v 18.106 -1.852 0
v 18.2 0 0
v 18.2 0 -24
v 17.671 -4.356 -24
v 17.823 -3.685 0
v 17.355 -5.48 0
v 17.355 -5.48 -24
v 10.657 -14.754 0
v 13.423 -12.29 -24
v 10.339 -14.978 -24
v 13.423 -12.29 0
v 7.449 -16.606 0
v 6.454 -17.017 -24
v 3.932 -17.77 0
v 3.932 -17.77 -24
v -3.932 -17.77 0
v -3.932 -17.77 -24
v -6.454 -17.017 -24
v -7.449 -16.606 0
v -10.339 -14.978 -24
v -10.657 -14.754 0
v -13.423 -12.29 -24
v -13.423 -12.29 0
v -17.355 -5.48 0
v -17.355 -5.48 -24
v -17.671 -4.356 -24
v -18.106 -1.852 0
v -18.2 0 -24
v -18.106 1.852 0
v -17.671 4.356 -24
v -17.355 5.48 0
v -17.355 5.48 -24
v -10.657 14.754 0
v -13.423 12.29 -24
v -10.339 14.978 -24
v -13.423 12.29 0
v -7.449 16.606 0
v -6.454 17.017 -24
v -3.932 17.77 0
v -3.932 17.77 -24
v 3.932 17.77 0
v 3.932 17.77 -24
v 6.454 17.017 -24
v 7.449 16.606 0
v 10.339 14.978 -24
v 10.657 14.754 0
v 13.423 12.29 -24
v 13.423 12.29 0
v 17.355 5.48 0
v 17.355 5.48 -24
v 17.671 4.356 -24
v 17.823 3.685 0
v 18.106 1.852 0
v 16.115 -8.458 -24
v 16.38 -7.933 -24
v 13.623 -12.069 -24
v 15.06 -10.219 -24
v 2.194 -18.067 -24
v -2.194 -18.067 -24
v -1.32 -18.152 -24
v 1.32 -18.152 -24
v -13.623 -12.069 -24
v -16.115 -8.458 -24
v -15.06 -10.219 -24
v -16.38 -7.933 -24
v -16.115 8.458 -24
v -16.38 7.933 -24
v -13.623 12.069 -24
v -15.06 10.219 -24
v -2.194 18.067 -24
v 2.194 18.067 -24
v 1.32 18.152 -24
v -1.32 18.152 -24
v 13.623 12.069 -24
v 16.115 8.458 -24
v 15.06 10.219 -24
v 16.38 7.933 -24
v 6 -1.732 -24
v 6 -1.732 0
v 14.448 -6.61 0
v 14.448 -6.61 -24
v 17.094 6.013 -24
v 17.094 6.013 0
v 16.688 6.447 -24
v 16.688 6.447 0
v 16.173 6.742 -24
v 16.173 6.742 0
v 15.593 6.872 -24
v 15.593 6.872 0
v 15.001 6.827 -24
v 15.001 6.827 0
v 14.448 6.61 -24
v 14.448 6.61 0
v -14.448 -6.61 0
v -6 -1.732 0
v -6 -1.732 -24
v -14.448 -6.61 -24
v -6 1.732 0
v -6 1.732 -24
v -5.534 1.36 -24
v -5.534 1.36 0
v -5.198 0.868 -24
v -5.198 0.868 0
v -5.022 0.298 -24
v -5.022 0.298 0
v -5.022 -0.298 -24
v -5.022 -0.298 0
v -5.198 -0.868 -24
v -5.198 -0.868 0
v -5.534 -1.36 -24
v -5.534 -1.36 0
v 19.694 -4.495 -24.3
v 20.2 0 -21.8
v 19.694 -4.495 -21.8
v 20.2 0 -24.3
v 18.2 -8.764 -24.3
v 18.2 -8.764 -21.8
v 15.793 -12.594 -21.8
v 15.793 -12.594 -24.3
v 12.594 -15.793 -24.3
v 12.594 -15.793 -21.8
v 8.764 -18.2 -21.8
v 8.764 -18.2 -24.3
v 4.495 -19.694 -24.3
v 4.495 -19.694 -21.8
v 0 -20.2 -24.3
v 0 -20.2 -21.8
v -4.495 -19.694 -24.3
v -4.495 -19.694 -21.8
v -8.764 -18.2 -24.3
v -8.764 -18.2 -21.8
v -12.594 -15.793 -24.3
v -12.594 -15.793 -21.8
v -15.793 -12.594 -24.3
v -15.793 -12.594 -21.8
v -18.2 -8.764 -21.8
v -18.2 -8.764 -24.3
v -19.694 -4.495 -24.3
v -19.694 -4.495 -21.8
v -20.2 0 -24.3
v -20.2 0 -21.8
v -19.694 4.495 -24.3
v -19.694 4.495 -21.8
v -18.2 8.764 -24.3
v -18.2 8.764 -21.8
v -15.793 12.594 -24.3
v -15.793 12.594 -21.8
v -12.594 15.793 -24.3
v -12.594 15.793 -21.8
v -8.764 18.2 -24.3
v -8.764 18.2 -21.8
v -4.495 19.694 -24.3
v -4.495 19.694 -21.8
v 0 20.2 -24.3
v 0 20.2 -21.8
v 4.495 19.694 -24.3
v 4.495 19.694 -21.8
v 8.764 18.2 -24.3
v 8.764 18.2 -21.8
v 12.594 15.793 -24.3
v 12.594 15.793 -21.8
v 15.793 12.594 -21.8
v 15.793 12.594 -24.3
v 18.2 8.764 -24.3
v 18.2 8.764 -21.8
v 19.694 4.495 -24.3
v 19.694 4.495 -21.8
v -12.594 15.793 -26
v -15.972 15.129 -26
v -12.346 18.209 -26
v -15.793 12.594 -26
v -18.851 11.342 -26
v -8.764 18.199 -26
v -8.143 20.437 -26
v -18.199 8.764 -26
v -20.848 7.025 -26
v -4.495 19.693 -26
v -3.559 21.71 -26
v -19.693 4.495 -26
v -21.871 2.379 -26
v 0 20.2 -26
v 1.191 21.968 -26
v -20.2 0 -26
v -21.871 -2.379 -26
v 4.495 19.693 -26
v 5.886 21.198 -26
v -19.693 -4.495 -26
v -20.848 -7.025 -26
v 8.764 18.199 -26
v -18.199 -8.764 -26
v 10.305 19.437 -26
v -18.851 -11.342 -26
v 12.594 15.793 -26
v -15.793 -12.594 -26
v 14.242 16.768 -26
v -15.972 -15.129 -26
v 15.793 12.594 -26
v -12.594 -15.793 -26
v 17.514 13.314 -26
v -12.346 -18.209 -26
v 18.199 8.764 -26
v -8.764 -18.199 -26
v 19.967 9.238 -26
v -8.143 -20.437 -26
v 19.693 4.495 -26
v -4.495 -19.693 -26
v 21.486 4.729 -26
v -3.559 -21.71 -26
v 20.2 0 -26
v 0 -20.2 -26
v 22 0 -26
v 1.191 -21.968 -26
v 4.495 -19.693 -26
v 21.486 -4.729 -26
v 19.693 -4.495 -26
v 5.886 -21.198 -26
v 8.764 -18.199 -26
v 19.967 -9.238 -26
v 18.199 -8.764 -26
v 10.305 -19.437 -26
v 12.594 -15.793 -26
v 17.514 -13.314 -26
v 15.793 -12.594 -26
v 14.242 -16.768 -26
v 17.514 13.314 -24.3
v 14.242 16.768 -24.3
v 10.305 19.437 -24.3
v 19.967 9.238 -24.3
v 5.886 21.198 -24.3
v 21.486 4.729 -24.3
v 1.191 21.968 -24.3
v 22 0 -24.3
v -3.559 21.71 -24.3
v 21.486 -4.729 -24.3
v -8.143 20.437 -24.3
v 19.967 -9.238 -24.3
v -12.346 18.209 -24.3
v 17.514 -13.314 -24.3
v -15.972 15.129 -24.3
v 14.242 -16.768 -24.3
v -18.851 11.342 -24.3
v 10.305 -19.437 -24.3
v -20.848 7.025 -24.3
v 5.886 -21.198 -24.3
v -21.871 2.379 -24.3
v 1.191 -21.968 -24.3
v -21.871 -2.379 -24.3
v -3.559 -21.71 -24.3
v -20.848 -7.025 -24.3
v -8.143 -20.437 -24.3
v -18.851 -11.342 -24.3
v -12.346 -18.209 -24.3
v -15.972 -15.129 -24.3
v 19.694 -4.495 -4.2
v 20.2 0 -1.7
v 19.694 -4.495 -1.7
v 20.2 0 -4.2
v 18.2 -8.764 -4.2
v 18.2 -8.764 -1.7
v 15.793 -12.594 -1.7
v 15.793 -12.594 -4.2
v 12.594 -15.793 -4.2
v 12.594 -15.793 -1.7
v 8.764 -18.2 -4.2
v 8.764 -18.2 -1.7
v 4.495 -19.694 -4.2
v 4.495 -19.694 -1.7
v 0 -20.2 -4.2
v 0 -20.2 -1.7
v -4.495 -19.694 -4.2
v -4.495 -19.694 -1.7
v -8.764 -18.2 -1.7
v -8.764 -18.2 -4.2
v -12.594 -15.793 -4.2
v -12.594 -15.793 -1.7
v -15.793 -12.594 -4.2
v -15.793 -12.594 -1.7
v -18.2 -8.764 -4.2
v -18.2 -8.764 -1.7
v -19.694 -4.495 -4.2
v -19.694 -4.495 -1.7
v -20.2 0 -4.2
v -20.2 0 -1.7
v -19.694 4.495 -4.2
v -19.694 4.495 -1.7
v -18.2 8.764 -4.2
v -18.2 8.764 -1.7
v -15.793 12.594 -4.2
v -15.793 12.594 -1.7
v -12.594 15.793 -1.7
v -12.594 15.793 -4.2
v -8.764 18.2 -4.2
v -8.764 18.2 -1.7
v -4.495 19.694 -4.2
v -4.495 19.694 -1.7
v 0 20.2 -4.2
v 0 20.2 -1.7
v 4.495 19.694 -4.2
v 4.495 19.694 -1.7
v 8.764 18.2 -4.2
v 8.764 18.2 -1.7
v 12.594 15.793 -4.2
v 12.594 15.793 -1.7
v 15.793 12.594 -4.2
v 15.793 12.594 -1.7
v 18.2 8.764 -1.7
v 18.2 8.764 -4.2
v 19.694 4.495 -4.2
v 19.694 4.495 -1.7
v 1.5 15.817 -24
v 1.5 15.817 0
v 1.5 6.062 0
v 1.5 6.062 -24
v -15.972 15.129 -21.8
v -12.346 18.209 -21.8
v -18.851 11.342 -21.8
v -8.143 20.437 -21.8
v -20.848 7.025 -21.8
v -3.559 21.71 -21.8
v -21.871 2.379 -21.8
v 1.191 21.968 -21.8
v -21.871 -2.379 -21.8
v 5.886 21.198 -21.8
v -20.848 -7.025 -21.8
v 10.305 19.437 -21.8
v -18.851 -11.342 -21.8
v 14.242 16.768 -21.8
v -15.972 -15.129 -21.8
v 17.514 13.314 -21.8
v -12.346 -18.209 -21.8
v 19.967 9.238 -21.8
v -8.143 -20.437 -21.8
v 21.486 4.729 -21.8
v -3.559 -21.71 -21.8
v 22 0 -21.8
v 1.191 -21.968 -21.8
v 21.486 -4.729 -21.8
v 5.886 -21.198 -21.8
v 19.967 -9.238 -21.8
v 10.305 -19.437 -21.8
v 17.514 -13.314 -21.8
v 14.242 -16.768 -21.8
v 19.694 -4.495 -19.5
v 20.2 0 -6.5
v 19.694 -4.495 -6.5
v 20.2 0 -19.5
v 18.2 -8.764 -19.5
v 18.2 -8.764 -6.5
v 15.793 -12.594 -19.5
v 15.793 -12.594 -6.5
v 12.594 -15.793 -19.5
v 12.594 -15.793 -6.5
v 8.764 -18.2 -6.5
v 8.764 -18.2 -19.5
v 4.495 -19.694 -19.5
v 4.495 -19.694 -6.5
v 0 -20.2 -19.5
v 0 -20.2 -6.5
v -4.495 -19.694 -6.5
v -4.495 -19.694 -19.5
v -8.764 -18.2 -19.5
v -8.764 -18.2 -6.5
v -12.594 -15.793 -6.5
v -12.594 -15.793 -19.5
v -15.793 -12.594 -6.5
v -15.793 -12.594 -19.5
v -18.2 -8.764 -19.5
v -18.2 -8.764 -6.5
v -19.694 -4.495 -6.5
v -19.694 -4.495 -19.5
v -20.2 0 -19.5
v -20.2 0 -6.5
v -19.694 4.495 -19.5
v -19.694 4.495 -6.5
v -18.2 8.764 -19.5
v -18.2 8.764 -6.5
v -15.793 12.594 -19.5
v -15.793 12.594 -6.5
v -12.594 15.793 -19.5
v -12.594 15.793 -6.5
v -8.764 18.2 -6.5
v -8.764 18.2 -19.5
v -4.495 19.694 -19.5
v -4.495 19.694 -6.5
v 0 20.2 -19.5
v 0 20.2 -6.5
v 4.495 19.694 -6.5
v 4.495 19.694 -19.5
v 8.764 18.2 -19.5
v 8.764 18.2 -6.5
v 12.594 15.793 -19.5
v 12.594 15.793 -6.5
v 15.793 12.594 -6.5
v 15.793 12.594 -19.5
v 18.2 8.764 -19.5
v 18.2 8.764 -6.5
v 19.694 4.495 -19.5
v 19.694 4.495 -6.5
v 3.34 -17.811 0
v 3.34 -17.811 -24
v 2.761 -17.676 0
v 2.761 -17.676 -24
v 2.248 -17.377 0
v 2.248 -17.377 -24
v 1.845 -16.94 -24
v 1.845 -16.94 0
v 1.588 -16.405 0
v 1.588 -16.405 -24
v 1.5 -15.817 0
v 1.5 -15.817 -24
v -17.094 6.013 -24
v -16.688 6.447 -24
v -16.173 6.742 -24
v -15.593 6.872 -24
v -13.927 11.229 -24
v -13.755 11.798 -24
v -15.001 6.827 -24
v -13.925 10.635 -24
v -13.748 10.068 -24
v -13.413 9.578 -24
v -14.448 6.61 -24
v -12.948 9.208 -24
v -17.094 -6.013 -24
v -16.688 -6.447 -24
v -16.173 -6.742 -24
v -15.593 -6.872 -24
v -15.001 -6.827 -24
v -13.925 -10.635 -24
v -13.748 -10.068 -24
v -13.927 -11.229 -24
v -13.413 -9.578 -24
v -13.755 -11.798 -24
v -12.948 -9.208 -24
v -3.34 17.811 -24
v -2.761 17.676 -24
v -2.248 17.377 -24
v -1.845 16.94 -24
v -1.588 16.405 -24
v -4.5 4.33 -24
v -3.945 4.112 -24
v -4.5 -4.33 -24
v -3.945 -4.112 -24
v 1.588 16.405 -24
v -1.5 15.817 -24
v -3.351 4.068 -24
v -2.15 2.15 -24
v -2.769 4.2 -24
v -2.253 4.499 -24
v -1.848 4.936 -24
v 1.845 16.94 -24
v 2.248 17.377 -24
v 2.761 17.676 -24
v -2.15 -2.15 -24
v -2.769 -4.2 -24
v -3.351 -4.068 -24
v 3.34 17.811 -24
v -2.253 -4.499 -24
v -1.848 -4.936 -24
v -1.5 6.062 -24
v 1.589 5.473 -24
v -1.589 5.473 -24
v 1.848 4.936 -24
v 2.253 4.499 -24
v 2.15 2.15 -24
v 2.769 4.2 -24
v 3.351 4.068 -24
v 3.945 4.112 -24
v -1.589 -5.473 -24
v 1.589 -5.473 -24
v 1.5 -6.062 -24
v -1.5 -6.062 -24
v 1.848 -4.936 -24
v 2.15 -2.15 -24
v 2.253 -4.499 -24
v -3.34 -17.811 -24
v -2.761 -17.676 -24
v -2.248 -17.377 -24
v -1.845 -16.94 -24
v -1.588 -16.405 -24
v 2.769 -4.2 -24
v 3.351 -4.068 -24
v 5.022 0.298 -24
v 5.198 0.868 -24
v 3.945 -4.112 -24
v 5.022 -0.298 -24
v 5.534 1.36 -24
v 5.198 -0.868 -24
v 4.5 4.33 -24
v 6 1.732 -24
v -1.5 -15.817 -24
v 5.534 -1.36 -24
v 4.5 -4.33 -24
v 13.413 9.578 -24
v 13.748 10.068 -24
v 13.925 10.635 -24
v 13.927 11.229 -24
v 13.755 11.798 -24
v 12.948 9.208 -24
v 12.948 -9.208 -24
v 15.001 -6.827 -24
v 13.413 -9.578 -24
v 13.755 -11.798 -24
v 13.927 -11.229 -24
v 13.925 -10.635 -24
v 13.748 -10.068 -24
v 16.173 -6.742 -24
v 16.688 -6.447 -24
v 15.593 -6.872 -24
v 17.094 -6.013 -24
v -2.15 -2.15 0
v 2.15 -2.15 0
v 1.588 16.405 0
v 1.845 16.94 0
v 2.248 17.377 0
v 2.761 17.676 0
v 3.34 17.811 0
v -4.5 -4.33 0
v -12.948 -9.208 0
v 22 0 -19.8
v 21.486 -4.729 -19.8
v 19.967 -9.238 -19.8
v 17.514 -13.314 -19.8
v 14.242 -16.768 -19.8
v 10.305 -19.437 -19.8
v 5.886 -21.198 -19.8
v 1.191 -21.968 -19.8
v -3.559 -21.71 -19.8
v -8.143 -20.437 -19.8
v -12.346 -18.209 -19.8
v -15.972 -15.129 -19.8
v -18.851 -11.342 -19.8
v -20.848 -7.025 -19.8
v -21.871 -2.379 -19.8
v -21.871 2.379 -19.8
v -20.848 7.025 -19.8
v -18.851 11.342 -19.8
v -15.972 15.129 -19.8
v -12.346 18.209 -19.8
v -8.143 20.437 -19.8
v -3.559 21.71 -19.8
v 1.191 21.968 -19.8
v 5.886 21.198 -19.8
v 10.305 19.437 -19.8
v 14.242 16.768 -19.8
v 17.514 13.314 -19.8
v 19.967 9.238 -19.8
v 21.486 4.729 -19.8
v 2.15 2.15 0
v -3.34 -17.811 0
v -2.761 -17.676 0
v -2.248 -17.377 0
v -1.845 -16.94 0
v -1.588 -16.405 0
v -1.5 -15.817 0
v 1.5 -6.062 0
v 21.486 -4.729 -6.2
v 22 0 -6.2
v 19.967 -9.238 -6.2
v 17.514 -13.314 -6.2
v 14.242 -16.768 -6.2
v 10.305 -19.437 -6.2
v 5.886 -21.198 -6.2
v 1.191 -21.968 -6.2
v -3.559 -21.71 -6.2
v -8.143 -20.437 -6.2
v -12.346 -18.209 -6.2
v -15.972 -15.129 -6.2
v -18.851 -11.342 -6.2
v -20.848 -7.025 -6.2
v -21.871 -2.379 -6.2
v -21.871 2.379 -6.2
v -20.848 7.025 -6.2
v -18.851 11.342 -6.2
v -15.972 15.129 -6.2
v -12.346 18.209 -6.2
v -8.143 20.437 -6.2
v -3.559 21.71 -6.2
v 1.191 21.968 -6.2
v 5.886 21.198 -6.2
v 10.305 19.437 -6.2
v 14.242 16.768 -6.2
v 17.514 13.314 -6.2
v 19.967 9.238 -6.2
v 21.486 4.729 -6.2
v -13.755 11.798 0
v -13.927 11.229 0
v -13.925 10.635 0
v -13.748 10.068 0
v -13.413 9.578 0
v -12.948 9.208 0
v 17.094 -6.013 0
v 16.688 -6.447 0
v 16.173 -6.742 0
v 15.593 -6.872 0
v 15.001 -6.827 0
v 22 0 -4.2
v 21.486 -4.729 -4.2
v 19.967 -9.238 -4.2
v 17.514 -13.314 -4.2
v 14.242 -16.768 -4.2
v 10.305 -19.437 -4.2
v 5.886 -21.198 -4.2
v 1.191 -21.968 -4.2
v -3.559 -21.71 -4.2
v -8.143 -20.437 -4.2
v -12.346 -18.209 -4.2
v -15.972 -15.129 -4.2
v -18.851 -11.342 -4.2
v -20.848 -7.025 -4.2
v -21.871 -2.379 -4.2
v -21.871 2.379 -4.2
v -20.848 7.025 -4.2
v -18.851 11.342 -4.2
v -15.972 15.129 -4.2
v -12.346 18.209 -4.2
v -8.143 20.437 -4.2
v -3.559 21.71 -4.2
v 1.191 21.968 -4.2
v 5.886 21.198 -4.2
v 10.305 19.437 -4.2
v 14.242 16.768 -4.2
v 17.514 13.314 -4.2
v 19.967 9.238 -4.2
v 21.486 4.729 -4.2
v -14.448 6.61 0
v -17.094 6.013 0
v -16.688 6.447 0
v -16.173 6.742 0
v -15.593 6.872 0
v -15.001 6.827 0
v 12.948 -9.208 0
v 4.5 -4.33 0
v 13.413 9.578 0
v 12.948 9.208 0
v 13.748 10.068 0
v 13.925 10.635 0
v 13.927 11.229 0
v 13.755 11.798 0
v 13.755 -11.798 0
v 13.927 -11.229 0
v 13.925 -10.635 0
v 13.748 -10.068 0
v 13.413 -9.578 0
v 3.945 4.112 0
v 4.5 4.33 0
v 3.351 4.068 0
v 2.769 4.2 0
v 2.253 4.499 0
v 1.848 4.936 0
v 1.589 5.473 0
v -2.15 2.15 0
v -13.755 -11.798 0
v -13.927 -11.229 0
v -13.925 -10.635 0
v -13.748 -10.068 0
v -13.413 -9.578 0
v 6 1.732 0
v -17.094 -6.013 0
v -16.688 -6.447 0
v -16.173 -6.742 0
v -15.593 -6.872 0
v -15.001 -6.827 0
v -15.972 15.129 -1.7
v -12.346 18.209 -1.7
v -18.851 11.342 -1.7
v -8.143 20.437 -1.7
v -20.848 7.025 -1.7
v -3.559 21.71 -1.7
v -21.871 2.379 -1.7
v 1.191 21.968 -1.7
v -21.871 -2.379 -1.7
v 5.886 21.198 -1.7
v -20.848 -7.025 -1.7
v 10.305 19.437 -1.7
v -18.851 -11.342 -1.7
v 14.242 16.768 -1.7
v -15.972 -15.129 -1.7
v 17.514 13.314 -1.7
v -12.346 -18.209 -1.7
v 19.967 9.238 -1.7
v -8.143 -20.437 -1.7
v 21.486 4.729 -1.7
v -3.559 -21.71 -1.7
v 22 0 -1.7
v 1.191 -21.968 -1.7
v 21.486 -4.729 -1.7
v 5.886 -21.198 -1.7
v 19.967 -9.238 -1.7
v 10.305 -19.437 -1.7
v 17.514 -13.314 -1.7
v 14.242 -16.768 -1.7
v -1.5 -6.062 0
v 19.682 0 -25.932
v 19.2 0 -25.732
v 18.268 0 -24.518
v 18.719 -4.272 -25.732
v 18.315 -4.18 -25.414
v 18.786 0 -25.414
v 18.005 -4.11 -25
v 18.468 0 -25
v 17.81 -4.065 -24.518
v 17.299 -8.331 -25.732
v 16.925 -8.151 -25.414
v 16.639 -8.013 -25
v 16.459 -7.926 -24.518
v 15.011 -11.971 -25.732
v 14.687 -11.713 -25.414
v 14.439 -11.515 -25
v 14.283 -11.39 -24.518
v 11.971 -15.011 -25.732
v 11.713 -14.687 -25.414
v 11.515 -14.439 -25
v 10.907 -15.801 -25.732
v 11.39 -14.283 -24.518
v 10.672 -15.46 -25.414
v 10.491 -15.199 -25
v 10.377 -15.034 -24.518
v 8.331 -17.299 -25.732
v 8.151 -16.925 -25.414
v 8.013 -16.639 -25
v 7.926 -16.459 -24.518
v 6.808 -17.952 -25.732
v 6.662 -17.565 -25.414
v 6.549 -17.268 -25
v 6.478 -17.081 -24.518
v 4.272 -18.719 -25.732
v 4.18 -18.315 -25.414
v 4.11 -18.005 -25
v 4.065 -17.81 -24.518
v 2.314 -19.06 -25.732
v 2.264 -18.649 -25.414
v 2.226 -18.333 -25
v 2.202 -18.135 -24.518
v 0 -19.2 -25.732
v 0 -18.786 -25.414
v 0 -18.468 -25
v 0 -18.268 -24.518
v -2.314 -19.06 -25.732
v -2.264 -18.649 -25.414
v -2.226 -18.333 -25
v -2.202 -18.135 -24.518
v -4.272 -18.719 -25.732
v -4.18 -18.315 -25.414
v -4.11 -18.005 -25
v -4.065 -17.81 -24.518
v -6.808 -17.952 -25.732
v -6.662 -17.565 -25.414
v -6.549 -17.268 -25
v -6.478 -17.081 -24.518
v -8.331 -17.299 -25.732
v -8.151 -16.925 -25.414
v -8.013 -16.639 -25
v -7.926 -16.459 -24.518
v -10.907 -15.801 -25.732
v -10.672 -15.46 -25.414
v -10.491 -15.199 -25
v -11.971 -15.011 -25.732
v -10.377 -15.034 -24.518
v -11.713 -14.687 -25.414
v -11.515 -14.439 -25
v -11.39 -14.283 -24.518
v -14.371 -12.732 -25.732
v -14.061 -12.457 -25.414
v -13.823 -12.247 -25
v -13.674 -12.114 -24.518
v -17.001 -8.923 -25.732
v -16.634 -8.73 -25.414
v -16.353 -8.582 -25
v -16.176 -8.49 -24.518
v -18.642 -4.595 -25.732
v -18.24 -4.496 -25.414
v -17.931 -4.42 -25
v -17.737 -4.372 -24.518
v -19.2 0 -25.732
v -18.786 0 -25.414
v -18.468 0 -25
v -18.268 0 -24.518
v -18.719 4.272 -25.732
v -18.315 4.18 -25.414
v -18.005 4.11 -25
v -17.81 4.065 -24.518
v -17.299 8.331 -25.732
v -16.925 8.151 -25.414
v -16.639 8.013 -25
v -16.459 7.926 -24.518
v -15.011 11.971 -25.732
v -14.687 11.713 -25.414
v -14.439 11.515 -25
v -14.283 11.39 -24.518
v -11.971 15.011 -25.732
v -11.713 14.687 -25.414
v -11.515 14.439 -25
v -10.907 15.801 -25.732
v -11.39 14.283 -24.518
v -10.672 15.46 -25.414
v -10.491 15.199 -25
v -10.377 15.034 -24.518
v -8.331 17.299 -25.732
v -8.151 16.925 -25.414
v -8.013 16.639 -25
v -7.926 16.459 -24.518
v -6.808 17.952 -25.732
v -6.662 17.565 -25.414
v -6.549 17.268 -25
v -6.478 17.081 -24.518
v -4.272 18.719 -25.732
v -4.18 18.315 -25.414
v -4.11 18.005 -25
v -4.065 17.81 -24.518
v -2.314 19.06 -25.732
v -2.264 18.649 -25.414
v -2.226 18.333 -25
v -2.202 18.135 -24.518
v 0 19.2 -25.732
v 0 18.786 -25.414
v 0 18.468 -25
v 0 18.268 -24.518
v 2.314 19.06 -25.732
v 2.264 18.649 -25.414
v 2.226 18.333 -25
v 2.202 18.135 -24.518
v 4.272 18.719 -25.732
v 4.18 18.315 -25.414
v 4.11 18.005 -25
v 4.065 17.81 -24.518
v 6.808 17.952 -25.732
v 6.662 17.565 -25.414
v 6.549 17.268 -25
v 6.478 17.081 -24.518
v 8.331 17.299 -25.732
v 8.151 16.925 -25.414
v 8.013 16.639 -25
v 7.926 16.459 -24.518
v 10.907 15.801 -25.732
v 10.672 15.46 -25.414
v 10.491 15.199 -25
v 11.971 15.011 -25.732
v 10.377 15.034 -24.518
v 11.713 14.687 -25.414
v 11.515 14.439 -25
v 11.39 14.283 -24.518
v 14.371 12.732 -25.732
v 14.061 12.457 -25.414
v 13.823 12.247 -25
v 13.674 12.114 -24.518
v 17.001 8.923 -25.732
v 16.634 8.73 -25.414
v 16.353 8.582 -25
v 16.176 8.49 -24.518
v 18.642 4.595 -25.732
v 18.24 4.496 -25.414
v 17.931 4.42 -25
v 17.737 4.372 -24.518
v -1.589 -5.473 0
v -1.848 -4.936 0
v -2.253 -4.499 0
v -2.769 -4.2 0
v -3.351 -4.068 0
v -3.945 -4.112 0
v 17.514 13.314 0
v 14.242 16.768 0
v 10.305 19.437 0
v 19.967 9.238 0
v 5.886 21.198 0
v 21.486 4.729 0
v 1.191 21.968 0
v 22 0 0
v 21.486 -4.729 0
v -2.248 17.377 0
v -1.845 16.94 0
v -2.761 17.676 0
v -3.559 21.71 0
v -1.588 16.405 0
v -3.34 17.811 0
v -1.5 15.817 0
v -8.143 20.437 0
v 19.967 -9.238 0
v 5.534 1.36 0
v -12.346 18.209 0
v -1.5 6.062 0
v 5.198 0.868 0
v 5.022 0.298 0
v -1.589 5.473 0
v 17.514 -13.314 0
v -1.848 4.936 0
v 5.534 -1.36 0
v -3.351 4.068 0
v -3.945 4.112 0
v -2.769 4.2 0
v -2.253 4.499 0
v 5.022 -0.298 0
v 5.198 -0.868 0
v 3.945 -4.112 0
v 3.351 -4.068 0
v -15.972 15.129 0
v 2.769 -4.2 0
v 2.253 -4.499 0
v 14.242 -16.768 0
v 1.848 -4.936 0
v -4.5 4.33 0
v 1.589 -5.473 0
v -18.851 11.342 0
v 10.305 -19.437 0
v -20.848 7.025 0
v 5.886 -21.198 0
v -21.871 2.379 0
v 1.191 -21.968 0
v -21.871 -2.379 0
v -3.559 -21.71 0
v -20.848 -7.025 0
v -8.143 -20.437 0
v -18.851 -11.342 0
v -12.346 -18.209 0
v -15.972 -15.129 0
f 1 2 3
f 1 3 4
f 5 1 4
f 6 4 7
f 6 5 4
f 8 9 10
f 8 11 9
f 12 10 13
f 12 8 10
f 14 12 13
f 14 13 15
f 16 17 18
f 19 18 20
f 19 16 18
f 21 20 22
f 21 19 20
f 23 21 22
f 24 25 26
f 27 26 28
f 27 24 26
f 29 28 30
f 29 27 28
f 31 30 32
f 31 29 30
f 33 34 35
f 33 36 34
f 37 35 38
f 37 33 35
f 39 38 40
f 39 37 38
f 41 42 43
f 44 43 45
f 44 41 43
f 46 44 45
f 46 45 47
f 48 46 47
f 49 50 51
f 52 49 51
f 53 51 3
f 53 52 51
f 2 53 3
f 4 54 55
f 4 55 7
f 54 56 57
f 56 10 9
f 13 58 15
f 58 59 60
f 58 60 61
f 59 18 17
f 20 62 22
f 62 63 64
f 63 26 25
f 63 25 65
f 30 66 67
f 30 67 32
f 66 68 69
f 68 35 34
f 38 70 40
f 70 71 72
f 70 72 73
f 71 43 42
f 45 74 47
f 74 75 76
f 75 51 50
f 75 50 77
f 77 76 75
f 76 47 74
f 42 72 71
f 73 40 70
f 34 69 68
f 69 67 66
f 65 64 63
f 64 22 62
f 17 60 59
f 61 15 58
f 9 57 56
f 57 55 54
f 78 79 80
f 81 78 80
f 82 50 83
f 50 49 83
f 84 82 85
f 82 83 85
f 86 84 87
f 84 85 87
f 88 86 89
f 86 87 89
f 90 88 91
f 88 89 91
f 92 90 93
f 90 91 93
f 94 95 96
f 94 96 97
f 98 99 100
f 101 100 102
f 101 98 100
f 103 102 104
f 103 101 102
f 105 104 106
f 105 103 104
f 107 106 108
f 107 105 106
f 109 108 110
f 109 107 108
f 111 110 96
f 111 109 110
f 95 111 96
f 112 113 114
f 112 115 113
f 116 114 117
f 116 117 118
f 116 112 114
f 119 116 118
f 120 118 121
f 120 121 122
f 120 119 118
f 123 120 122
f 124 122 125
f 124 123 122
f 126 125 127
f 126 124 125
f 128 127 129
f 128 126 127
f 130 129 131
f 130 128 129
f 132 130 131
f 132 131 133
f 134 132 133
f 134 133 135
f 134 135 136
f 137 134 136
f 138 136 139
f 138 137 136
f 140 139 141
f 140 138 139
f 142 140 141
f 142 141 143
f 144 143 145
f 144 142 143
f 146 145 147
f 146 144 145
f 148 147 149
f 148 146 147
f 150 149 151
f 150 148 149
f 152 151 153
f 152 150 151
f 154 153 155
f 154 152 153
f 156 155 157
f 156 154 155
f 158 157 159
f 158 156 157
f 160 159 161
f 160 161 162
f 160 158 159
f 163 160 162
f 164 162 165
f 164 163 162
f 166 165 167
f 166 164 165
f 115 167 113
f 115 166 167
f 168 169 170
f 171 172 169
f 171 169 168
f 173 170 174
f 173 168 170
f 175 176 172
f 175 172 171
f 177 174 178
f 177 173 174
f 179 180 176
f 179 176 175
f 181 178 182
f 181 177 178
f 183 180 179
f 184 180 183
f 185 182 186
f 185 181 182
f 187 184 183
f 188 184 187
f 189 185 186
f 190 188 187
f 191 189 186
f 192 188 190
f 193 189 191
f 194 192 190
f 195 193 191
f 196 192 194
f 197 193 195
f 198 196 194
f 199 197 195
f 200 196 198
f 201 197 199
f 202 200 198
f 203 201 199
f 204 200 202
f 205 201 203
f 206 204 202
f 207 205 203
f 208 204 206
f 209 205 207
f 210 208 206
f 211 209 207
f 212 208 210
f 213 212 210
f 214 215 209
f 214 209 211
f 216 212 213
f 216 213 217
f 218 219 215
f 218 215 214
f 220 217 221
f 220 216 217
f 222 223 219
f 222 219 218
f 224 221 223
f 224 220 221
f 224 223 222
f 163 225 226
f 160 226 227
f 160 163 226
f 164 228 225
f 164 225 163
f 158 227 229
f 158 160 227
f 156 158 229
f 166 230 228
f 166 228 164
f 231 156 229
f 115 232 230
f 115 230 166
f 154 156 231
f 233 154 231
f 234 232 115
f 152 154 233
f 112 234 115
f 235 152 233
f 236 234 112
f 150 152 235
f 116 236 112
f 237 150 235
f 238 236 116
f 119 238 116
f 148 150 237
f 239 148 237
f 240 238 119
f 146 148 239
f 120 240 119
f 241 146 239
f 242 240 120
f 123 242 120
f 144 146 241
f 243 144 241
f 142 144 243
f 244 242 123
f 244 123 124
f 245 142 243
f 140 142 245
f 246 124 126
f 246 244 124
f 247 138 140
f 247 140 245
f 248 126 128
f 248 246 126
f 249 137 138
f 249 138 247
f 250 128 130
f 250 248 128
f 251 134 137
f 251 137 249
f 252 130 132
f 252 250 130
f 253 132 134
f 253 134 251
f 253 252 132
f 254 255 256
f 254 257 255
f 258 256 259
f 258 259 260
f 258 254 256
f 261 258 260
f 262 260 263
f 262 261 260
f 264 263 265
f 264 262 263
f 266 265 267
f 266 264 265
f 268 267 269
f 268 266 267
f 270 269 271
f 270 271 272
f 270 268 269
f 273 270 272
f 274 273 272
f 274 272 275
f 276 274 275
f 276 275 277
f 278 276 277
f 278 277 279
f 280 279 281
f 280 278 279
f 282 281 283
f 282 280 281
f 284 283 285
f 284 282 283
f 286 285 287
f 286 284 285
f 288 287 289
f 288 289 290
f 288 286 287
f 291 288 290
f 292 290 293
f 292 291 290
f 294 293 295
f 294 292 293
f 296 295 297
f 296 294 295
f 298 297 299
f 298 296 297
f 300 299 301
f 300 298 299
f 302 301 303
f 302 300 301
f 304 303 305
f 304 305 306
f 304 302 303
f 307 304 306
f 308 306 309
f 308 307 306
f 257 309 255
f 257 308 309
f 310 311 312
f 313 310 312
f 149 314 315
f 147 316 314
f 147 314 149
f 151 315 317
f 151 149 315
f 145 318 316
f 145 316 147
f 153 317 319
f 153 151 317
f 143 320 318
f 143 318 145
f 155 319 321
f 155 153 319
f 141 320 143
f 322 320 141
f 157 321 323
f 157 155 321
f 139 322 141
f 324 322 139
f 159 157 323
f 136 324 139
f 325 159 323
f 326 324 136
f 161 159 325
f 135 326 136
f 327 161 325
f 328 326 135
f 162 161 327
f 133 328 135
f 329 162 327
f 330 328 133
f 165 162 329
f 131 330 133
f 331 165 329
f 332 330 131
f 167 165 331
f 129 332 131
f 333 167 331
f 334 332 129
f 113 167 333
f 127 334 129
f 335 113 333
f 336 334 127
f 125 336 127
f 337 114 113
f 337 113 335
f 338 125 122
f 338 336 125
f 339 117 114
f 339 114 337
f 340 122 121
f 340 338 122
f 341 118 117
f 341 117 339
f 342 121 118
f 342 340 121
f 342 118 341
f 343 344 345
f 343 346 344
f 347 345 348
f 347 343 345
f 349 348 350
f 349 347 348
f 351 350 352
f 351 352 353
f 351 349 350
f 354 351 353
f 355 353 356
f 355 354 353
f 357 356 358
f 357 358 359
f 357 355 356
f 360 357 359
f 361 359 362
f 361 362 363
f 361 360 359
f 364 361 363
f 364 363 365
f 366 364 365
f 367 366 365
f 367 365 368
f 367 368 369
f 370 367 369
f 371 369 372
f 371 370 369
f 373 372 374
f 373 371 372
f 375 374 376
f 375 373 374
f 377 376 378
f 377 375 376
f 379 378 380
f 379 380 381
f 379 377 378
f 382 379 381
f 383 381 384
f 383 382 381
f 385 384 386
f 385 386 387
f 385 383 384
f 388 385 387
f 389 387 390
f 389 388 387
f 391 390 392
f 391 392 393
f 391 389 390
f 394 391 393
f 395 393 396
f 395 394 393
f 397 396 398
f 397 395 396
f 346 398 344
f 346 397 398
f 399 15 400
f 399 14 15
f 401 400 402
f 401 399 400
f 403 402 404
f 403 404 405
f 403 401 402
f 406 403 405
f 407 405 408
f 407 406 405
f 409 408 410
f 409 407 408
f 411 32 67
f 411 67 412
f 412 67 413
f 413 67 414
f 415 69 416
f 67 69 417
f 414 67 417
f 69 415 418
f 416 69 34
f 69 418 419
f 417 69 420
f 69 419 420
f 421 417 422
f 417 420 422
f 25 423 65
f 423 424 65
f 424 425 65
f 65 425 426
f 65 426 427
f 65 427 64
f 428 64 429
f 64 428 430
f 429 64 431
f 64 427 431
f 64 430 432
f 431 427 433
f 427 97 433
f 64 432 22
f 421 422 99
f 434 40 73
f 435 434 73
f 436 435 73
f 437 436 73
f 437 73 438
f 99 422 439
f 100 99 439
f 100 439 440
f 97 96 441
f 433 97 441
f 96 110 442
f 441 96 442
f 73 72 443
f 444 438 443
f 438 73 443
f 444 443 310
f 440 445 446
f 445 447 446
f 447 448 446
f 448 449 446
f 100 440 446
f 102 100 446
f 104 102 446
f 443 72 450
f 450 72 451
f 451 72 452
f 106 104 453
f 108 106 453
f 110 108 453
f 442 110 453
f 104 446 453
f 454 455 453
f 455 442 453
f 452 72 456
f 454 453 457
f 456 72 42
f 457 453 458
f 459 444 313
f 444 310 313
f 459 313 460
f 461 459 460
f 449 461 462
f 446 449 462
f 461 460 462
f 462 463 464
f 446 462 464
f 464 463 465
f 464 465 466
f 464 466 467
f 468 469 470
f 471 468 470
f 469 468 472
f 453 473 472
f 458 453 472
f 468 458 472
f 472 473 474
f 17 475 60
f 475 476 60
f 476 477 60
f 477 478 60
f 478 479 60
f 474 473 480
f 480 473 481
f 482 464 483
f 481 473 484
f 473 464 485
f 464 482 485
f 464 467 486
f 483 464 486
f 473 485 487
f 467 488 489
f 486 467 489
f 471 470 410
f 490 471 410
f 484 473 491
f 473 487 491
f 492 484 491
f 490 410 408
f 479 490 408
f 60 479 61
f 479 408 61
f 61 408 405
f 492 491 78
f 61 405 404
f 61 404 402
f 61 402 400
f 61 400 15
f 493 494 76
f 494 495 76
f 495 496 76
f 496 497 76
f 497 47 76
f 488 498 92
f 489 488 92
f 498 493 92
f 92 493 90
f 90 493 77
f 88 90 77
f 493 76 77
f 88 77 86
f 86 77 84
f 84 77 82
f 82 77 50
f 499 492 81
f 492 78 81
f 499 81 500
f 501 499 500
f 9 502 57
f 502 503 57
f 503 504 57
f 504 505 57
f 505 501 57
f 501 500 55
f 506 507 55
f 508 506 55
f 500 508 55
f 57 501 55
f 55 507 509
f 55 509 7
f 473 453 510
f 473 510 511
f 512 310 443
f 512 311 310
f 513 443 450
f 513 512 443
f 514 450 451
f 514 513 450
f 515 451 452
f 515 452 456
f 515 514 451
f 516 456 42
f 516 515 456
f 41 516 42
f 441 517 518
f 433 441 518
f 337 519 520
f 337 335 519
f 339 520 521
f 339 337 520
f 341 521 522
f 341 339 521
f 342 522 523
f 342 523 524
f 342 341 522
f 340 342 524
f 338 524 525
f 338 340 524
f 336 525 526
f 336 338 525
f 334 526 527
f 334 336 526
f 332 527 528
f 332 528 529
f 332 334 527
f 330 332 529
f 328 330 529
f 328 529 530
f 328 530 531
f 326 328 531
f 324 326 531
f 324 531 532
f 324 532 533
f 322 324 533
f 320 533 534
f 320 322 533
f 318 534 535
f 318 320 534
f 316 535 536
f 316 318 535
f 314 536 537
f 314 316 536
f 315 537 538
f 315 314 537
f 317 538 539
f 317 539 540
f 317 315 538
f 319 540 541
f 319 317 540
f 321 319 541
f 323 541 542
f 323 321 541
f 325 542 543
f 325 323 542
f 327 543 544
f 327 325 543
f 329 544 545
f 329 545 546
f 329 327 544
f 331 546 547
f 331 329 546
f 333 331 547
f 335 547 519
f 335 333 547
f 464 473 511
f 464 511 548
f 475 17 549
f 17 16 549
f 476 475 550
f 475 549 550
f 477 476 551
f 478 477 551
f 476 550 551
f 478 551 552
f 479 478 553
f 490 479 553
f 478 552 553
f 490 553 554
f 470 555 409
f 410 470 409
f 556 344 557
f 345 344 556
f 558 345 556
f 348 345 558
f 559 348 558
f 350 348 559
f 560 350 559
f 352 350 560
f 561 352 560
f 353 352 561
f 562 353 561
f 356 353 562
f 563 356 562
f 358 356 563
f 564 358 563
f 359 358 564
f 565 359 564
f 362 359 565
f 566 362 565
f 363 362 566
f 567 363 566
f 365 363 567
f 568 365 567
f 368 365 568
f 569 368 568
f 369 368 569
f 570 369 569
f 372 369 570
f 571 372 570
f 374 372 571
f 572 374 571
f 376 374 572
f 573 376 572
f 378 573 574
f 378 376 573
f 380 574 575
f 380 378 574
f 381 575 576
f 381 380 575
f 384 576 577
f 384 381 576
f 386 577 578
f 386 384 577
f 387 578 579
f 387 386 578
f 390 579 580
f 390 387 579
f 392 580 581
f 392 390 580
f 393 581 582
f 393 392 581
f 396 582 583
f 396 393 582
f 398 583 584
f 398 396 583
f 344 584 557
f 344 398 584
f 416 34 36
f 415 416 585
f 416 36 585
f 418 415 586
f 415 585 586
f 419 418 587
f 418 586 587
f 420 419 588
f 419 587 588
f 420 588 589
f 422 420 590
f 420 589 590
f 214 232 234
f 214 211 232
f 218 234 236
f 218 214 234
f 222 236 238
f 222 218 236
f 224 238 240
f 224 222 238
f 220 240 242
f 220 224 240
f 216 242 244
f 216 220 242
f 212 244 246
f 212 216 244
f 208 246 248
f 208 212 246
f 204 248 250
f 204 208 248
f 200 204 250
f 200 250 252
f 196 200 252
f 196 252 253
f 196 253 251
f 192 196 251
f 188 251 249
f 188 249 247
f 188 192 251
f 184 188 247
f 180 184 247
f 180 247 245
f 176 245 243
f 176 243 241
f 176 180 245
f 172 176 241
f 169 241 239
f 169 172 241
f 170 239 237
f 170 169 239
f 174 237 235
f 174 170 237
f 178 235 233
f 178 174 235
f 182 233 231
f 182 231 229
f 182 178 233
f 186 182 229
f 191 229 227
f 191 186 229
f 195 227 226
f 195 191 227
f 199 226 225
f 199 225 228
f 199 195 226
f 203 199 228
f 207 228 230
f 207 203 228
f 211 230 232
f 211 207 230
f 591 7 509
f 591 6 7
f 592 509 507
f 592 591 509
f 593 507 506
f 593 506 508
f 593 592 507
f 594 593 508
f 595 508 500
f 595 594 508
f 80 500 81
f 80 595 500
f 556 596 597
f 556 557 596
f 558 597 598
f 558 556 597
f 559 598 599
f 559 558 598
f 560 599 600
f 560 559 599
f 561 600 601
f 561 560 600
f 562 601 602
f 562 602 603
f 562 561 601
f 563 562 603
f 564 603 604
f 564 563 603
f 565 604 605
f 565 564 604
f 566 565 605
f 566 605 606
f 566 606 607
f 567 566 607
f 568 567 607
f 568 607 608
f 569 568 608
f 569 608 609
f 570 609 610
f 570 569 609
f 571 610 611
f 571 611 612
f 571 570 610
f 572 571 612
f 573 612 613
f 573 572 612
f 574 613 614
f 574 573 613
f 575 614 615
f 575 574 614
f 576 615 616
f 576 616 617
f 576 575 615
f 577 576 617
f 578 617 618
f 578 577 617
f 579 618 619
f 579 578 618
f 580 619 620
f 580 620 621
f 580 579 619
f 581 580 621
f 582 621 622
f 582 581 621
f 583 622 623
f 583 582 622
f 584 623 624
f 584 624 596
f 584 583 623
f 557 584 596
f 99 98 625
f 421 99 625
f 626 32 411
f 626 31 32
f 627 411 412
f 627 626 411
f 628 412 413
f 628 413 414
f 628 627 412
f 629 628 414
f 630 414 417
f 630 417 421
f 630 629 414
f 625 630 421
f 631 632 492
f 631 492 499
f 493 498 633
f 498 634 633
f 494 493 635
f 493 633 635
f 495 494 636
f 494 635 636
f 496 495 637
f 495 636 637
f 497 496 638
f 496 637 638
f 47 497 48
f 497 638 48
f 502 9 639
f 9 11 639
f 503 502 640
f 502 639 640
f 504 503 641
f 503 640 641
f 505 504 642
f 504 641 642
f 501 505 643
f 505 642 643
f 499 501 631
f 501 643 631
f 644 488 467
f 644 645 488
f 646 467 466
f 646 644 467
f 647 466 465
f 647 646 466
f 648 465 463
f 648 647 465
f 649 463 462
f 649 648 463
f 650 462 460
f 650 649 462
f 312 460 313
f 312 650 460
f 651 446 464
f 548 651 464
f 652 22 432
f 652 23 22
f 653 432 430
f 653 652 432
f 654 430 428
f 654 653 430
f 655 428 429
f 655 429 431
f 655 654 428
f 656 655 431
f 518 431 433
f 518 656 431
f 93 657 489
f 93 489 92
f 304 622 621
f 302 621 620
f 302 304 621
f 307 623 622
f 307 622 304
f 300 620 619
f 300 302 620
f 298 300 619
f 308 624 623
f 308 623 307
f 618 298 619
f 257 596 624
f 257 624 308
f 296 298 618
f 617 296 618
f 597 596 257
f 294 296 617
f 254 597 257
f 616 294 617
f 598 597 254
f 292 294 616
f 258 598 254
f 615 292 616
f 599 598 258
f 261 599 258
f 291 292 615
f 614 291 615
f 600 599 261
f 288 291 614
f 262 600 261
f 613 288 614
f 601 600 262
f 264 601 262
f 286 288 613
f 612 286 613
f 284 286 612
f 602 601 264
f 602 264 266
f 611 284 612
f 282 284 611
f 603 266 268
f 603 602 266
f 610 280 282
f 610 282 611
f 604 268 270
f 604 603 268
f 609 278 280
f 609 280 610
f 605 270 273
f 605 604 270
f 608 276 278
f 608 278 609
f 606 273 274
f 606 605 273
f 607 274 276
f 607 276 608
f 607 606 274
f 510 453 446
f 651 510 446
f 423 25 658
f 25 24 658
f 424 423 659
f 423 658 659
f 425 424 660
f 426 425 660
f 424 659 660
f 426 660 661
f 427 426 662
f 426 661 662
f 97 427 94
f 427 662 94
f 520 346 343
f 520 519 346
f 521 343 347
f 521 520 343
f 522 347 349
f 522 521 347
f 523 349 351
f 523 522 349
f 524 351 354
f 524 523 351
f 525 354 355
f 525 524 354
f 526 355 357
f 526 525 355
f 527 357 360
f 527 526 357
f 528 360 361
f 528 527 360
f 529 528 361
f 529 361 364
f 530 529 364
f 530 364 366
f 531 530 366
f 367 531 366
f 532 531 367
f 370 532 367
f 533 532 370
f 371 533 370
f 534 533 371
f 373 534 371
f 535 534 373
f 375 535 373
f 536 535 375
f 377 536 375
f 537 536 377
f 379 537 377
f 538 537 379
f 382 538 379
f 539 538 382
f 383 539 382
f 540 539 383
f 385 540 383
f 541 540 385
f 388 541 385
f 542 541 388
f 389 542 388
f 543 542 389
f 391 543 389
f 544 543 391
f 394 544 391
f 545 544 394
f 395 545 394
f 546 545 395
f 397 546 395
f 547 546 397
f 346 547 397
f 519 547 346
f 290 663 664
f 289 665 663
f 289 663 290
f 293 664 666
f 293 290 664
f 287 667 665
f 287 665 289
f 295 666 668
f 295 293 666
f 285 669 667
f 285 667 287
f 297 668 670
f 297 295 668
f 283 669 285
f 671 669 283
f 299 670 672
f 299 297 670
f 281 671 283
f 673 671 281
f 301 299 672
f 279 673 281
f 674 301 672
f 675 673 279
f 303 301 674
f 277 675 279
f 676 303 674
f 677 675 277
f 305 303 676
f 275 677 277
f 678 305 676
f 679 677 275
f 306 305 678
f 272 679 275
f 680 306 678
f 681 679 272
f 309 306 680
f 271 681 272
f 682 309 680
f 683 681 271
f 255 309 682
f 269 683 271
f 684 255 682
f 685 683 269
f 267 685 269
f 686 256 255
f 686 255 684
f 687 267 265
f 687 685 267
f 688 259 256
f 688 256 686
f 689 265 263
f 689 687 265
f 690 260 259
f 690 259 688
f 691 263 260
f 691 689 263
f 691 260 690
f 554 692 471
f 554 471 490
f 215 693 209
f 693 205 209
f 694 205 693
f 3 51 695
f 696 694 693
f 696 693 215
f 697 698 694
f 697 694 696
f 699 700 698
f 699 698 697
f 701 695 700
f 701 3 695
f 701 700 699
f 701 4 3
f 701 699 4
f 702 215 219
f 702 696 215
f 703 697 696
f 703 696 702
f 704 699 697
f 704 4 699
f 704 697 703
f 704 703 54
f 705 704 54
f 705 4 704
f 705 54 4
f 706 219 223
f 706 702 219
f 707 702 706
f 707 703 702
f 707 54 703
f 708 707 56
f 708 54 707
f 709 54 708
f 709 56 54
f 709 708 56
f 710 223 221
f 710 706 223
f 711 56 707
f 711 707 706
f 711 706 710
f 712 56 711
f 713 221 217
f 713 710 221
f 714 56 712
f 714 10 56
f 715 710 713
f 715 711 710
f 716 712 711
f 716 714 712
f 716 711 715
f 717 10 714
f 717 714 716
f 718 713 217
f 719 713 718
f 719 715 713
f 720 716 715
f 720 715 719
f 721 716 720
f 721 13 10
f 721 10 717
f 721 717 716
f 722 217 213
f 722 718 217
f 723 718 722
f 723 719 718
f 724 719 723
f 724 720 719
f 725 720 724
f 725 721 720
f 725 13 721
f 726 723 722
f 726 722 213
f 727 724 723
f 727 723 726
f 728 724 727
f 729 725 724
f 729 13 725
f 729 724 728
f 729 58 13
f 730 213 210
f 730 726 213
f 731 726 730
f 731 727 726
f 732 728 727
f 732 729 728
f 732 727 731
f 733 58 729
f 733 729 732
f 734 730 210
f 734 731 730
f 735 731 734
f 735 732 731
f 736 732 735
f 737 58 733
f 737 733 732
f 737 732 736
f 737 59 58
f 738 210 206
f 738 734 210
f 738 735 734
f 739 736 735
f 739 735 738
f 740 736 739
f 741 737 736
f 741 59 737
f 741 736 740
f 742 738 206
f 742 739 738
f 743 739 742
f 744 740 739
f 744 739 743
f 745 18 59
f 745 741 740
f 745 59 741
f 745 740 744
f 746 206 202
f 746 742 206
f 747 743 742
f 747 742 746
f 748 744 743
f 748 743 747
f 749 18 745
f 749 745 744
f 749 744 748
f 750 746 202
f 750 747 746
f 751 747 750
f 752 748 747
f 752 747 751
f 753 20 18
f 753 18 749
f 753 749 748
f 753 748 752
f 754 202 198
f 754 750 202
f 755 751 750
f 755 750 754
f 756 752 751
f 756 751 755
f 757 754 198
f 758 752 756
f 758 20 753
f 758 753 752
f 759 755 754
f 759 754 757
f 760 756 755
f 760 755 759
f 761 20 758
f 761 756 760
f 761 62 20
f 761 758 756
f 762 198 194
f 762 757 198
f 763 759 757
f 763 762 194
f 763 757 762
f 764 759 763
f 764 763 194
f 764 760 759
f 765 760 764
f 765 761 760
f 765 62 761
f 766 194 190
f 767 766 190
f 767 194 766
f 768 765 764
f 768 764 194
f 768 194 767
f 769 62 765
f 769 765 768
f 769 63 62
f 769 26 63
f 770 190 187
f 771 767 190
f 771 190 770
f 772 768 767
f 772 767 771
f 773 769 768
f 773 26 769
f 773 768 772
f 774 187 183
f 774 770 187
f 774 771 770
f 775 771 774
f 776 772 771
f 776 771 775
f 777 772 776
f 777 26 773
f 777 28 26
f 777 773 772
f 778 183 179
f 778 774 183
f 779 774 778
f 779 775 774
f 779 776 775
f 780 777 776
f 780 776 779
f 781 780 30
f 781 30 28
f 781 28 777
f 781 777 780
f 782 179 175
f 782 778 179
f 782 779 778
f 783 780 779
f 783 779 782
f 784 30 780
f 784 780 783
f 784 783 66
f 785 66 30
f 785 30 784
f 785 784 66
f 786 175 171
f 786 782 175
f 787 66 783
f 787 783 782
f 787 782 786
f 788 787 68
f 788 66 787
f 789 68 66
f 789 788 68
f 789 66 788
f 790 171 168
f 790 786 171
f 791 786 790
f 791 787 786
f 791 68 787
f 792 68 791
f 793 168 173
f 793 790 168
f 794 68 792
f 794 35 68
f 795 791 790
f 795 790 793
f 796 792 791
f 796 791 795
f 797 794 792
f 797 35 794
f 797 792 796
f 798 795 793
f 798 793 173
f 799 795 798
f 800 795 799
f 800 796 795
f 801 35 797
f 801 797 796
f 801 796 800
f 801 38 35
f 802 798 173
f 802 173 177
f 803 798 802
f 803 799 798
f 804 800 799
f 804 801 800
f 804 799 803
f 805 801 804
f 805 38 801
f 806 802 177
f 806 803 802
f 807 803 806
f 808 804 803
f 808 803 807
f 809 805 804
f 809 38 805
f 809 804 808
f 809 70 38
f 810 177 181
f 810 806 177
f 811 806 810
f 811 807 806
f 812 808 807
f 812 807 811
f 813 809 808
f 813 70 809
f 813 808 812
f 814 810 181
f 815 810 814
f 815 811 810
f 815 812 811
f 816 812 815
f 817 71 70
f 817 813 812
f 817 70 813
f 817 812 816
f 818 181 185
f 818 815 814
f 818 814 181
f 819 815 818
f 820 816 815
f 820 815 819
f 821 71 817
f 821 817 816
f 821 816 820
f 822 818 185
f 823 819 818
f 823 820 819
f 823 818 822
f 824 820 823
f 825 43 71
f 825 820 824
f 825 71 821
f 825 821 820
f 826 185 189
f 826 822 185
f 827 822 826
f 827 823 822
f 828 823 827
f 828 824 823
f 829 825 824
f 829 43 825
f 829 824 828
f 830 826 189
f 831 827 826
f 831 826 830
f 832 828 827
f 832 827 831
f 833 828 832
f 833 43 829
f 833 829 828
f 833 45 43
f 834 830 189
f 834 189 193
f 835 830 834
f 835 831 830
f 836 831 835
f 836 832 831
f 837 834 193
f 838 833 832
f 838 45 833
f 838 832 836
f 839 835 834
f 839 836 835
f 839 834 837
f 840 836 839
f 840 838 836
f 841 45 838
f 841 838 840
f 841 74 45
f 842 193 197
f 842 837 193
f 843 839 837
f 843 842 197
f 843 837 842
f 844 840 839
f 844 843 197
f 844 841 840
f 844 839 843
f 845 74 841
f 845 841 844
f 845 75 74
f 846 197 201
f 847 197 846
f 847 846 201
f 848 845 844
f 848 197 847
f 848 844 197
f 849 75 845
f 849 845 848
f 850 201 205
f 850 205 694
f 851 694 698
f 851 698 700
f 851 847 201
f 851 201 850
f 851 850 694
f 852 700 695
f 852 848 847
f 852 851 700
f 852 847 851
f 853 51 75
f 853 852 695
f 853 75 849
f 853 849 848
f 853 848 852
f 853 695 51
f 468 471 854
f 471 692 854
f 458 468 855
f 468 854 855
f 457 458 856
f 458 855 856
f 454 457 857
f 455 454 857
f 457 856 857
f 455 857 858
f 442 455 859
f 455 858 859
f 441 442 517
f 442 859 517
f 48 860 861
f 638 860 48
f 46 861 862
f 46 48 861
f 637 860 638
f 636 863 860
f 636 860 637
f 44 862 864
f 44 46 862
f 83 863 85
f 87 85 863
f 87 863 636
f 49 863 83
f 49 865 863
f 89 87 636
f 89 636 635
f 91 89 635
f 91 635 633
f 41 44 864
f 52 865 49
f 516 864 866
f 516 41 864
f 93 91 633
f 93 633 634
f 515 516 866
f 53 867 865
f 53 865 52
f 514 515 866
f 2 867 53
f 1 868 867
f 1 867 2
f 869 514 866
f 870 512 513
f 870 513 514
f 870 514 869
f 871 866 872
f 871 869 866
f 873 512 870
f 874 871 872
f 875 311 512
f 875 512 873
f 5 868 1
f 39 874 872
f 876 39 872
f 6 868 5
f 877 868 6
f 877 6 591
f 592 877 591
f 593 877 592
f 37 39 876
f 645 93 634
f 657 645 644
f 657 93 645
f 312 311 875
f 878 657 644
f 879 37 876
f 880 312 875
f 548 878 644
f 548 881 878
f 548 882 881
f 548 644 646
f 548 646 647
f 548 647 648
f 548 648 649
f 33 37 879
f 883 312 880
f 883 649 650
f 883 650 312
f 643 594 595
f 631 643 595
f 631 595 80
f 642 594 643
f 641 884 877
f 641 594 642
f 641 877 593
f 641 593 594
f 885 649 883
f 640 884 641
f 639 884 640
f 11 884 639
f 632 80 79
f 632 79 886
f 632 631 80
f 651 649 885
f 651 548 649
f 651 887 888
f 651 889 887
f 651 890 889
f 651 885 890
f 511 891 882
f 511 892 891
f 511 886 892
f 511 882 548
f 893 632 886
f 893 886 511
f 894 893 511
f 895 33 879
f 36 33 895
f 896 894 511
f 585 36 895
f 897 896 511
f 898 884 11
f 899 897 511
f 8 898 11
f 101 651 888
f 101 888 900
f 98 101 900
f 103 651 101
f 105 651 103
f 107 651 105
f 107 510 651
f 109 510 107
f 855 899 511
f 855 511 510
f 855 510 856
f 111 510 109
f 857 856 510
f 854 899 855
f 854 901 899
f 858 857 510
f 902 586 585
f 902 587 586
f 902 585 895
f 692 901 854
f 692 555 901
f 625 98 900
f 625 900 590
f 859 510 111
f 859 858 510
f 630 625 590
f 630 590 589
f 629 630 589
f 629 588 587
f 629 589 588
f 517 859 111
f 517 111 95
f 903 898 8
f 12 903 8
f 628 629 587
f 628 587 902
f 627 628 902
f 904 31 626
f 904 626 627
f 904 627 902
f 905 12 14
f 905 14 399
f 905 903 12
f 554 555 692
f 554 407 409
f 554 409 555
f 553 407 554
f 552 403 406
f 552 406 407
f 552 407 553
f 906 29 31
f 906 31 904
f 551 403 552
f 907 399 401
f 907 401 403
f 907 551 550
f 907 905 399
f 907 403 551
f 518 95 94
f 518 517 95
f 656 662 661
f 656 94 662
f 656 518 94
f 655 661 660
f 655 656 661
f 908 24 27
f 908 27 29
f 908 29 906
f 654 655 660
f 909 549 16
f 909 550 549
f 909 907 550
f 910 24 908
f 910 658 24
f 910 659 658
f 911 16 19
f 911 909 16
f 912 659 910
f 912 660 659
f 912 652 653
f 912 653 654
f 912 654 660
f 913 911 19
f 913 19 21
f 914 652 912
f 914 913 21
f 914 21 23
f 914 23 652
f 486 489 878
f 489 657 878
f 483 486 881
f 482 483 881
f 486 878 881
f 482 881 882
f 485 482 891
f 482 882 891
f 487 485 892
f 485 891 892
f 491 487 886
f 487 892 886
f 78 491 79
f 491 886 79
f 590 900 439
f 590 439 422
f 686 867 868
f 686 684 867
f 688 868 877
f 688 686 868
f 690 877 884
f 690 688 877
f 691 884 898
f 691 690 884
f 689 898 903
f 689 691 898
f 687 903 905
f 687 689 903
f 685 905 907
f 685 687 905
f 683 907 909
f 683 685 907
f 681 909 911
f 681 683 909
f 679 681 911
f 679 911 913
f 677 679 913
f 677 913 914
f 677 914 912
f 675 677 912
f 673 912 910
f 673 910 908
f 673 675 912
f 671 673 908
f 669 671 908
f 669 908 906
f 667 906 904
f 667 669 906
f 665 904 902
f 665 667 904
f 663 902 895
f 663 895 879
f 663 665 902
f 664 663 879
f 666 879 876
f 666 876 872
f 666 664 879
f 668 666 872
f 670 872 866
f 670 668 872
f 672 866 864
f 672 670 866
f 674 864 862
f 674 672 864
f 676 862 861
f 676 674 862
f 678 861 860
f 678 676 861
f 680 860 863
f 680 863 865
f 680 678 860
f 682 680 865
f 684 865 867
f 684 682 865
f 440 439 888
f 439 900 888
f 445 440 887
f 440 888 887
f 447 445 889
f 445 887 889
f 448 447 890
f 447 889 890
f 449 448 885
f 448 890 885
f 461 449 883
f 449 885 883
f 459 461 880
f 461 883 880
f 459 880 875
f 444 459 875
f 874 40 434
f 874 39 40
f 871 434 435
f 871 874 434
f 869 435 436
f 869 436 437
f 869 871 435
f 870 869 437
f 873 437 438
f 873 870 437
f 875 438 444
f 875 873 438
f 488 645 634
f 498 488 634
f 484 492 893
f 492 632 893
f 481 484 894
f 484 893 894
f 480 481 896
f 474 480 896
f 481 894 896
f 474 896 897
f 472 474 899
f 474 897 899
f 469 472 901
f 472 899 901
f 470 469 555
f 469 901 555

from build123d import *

# Parameters (mm, degrees)
SKETCH2_W               = 3
SKETCH2_H               = 18.2
BOSS_EXTRUDE1_DEPTH     = 24
CIRPATTERN1_COUNT       = 6
CUT_EXTRUDE1_DEPTH      = 41.546269865
CUT_EXTRUDE1_DEPTH_BACK = 41.546269865
SKETCH3_W               = 4.3
SKETCH3_H               = 4.3
FILLET1_R               = 2
FILLET2_R               = 2


with BuildPart() as part:
    # Sketch1 → Revolve1 (revolve)
    with BuildSketch(Plane(origin=(0, 0, 0), x_dir=(0, 0, -1), z_dir=(1, 0, 0)), mode=Mode.PRIVATE) as revolve1_sk:
        Polygon((0, 22), (1.7, 22), (1.7, 20.2), (4.2, 20.2), (4.2, 22), (6.2, 22), (6.5, 20.2), (19.5, 20.2), (19.8, 22), (21.8, 22), (21.8, 20.2), (24.3, 20.2), (24.3, 22), (26, 22), (26, 18.2), (0, 18.2), align=None)
    revolve(revolve1_sk.sketch.rotate(Axis((0, 0, 0.322174052), (0, 0, -1)), 90), axis=Axis((0, 0, 0.322174052), (0, 0, -1)))

    # Sketch2 → Boss-Extrude1 (add)
    with BuildSketch(Plane.XY):
        with Locations((0, 9.1)):
            Rectangle(SKETCH2_W, SKETCH2_H)
    boss_extrude1 = extrude(amount=-BOSS_EXTRUDE1_DEPTH)

    # CirPattern1: Boss-Extrude1 ×6 about axis
    cirpattern1_axis = Axis((0, 0, 0), (0, 0, 1))
    for i in range(1, CIRPATTERN1_COUNT):
        add(boss_extrude1.rotate(cirpattern1_axis, i * 360 / CIRPATTERN1_COUNT))

    # Sketch3 → Cut-Extrude1 (cut, two sides: drawn at the far end of the back side and taken through both)
    with BuildSketch(Plane.XY.offset(-CUT_EXTRUDE1_DEPTH_BACK)):
        Rectangle(SKETCH3_W, SKETCH3_H)
    extrude(amount=CUT_EXTRUDE1_DEPTH + CUT_EXTRUDE1_DEPTH_BACK, mode=Mode.SUBTRACT)

    # Fillet1
    fillet1_edges = [part.edges().sort_by_distance(p)[0] for p in [
        (14.958039343, 10.368078849, -12),
        (-14.958039343, 10.368078849, -12),
        (-1.5, 18.138081486, -12),
        (1.5, 18.138081486, -12),
        (-16.458039343, 7.770002637, -12),
        (-14.958039343, -10.368078849, -12),
        (-16.458039343, -7.770002637, -12),
        (1.5, -18.138081486, -12),
        (-1.5, -18.138081486, -12),
        (14.958039343, -10.368078849, -12),
        (16.458039343, -7.770002637, -12),
        (16.458039343, 7.770002637, -12),
        (3, 0, -12),
        (1.5, -2.598076211, -12),
        (-1.5, -2.598076211, -12),
        (-3, 0, -12),
        (1.5, 2.598076211, -12),
        (-1.5, 2.598076211, -12),
    ]]
    fillet(fillet1_edges, radius=FILLET1_R)

    # Fillet2
    fillet2_edges = [part.edges().sort_by_distance(p)[0] for p in [
        (-18.2, 0, -26),
    ]]
    fillet(fillet2_edges, radius=FILLET2_R - 0.0001)  # a hair under: the kernel refuses the full size


solid = part.part
